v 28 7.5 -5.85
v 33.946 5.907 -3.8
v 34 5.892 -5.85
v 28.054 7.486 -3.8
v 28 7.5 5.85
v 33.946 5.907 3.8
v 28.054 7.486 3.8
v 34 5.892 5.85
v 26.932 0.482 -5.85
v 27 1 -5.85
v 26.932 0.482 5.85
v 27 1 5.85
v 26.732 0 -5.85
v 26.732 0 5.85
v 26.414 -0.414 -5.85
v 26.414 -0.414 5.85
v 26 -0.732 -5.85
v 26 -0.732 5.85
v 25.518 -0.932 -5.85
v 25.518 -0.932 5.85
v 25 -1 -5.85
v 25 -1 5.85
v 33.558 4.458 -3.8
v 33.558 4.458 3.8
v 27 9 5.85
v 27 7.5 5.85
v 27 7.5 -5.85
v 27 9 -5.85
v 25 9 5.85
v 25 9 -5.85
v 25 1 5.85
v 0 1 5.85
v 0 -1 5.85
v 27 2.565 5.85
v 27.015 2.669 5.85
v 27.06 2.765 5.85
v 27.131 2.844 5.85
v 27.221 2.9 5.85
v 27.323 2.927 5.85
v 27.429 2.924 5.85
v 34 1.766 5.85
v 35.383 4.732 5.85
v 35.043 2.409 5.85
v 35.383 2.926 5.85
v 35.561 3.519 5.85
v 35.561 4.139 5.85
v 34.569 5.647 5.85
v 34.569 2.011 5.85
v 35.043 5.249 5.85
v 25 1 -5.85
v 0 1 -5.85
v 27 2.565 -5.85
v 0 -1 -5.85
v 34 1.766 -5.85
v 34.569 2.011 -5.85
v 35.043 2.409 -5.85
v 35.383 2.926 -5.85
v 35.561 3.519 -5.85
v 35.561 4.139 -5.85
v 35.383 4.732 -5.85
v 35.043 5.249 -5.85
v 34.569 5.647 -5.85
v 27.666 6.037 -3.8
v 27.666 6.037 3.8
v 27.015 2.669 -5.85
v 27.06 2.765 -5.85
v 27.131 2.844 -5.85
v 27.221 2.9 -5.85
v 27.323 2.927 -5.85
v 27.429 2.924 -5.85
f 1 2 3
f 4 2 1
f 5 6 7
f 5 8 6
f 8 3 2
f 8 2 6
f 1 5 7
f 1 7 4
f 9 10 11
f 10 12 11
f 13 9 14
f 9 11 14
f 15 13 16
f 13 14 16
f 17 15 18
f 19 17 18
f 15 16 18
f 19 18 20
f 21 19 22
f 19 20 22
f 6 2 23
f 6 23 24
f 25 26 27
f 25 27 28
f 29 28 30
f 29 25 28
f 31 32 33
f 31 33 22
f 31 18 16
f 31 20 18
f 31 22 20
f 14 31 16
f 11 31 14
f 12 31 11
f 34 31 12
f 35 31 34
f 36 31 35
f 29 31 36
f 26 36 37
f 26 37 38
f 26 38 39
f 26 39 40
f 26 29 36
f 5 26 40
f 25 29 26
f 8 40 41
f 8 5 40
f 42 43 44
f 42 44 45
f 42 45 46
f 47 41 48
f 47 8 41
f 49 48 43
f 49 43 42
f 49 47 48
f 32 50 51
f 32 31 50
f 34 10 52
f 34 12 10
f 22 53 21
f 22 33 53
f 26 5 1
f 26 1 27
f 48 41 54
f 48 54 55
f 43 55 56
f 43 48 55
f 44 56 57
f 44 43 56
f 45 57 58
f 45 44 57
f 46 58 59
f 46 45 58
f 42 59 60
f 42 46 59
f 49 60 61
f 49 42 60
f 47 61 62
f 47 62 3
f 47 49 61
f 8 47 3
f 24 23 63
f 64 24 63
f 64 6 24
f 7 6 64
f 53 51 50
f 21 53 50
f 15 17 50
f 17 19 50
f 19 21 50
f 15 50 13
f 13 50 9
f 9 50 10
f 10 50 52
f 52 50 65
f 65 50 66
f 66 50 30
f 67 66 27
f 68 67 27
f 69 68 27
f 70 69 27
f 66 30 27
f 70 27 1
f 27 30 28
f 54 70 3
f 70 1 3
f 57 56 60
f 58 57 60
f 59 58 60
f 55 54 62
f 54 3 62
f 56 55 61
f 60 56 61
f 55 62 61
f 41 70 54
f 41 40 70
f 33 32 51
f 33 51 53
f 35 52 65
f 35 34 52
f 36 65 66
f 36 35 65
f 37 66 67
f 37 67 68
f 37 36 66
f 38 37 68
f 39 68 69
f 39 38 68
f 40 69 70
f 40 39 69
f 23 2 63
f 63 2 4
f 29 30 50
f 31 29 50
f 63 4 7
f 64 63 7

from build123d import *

# Parameters (mm, degrees)
F1_DEPTH = 5.85
F2_R     = 2
F3_R     = 0.365402
F4_W     = 6.1
F4_H     = 7.6
F5_DEPTH = 1.5


with BuildPart() as f1:
    # F0 (on Top) → F1 (new body, symmetric)
    with BuildSketch(Plane.XY):
        with BuildLine():
            Line((25, 1), (0, 1))
            Line((0, 1), (0, -1))
            Line((0, -1), (27, -1))
            Line((27, -1), (27, 3))
            Line((27, 3), (34, 1.765711))
            ThreePointArc((34, 1.765711), (35.583223, 3.829008), (34, 5.892305))
            Line((34, 5.892305), (28, 7.5))
            Line((28, 7.5), (27, 7.5))
            Line((27, 7.5), (27, 9))
            Line((27, 9), (25, 9))
            Line((25, 9), (25, 1))
        make_face()
    extrude(amount=F1_DEPTH, both=True)

    # F2
    f2_edges = [f1.edges().sort_by_distance(p)[0] for p in [
        (27, -1, 0),
    ]]
    fillet(f2_edges, radius=F2_R)

    # F3
    f3_edges = [f1.edges().sort_by_distance(p)[0] for p in [
        (27, 3, 0),
    ]]
    fillet(f3_edges, radius=F3_R)

    # F4 (on face) → F5 (cut)
    with BuildSketch(Plane(origin=(3.750644, 13.997595, 0), x_dir=(-0.965926, 0.258819, 0), z_dir=(0.258819, 0.965926, 0))):
        with Locations((-28.210609, 0)):
            Rectangle(F4_W, F4_H)
    extrude(amount=-F5_DEPTH, mode=Mode.SUBTRACT)


solid = f1.part
